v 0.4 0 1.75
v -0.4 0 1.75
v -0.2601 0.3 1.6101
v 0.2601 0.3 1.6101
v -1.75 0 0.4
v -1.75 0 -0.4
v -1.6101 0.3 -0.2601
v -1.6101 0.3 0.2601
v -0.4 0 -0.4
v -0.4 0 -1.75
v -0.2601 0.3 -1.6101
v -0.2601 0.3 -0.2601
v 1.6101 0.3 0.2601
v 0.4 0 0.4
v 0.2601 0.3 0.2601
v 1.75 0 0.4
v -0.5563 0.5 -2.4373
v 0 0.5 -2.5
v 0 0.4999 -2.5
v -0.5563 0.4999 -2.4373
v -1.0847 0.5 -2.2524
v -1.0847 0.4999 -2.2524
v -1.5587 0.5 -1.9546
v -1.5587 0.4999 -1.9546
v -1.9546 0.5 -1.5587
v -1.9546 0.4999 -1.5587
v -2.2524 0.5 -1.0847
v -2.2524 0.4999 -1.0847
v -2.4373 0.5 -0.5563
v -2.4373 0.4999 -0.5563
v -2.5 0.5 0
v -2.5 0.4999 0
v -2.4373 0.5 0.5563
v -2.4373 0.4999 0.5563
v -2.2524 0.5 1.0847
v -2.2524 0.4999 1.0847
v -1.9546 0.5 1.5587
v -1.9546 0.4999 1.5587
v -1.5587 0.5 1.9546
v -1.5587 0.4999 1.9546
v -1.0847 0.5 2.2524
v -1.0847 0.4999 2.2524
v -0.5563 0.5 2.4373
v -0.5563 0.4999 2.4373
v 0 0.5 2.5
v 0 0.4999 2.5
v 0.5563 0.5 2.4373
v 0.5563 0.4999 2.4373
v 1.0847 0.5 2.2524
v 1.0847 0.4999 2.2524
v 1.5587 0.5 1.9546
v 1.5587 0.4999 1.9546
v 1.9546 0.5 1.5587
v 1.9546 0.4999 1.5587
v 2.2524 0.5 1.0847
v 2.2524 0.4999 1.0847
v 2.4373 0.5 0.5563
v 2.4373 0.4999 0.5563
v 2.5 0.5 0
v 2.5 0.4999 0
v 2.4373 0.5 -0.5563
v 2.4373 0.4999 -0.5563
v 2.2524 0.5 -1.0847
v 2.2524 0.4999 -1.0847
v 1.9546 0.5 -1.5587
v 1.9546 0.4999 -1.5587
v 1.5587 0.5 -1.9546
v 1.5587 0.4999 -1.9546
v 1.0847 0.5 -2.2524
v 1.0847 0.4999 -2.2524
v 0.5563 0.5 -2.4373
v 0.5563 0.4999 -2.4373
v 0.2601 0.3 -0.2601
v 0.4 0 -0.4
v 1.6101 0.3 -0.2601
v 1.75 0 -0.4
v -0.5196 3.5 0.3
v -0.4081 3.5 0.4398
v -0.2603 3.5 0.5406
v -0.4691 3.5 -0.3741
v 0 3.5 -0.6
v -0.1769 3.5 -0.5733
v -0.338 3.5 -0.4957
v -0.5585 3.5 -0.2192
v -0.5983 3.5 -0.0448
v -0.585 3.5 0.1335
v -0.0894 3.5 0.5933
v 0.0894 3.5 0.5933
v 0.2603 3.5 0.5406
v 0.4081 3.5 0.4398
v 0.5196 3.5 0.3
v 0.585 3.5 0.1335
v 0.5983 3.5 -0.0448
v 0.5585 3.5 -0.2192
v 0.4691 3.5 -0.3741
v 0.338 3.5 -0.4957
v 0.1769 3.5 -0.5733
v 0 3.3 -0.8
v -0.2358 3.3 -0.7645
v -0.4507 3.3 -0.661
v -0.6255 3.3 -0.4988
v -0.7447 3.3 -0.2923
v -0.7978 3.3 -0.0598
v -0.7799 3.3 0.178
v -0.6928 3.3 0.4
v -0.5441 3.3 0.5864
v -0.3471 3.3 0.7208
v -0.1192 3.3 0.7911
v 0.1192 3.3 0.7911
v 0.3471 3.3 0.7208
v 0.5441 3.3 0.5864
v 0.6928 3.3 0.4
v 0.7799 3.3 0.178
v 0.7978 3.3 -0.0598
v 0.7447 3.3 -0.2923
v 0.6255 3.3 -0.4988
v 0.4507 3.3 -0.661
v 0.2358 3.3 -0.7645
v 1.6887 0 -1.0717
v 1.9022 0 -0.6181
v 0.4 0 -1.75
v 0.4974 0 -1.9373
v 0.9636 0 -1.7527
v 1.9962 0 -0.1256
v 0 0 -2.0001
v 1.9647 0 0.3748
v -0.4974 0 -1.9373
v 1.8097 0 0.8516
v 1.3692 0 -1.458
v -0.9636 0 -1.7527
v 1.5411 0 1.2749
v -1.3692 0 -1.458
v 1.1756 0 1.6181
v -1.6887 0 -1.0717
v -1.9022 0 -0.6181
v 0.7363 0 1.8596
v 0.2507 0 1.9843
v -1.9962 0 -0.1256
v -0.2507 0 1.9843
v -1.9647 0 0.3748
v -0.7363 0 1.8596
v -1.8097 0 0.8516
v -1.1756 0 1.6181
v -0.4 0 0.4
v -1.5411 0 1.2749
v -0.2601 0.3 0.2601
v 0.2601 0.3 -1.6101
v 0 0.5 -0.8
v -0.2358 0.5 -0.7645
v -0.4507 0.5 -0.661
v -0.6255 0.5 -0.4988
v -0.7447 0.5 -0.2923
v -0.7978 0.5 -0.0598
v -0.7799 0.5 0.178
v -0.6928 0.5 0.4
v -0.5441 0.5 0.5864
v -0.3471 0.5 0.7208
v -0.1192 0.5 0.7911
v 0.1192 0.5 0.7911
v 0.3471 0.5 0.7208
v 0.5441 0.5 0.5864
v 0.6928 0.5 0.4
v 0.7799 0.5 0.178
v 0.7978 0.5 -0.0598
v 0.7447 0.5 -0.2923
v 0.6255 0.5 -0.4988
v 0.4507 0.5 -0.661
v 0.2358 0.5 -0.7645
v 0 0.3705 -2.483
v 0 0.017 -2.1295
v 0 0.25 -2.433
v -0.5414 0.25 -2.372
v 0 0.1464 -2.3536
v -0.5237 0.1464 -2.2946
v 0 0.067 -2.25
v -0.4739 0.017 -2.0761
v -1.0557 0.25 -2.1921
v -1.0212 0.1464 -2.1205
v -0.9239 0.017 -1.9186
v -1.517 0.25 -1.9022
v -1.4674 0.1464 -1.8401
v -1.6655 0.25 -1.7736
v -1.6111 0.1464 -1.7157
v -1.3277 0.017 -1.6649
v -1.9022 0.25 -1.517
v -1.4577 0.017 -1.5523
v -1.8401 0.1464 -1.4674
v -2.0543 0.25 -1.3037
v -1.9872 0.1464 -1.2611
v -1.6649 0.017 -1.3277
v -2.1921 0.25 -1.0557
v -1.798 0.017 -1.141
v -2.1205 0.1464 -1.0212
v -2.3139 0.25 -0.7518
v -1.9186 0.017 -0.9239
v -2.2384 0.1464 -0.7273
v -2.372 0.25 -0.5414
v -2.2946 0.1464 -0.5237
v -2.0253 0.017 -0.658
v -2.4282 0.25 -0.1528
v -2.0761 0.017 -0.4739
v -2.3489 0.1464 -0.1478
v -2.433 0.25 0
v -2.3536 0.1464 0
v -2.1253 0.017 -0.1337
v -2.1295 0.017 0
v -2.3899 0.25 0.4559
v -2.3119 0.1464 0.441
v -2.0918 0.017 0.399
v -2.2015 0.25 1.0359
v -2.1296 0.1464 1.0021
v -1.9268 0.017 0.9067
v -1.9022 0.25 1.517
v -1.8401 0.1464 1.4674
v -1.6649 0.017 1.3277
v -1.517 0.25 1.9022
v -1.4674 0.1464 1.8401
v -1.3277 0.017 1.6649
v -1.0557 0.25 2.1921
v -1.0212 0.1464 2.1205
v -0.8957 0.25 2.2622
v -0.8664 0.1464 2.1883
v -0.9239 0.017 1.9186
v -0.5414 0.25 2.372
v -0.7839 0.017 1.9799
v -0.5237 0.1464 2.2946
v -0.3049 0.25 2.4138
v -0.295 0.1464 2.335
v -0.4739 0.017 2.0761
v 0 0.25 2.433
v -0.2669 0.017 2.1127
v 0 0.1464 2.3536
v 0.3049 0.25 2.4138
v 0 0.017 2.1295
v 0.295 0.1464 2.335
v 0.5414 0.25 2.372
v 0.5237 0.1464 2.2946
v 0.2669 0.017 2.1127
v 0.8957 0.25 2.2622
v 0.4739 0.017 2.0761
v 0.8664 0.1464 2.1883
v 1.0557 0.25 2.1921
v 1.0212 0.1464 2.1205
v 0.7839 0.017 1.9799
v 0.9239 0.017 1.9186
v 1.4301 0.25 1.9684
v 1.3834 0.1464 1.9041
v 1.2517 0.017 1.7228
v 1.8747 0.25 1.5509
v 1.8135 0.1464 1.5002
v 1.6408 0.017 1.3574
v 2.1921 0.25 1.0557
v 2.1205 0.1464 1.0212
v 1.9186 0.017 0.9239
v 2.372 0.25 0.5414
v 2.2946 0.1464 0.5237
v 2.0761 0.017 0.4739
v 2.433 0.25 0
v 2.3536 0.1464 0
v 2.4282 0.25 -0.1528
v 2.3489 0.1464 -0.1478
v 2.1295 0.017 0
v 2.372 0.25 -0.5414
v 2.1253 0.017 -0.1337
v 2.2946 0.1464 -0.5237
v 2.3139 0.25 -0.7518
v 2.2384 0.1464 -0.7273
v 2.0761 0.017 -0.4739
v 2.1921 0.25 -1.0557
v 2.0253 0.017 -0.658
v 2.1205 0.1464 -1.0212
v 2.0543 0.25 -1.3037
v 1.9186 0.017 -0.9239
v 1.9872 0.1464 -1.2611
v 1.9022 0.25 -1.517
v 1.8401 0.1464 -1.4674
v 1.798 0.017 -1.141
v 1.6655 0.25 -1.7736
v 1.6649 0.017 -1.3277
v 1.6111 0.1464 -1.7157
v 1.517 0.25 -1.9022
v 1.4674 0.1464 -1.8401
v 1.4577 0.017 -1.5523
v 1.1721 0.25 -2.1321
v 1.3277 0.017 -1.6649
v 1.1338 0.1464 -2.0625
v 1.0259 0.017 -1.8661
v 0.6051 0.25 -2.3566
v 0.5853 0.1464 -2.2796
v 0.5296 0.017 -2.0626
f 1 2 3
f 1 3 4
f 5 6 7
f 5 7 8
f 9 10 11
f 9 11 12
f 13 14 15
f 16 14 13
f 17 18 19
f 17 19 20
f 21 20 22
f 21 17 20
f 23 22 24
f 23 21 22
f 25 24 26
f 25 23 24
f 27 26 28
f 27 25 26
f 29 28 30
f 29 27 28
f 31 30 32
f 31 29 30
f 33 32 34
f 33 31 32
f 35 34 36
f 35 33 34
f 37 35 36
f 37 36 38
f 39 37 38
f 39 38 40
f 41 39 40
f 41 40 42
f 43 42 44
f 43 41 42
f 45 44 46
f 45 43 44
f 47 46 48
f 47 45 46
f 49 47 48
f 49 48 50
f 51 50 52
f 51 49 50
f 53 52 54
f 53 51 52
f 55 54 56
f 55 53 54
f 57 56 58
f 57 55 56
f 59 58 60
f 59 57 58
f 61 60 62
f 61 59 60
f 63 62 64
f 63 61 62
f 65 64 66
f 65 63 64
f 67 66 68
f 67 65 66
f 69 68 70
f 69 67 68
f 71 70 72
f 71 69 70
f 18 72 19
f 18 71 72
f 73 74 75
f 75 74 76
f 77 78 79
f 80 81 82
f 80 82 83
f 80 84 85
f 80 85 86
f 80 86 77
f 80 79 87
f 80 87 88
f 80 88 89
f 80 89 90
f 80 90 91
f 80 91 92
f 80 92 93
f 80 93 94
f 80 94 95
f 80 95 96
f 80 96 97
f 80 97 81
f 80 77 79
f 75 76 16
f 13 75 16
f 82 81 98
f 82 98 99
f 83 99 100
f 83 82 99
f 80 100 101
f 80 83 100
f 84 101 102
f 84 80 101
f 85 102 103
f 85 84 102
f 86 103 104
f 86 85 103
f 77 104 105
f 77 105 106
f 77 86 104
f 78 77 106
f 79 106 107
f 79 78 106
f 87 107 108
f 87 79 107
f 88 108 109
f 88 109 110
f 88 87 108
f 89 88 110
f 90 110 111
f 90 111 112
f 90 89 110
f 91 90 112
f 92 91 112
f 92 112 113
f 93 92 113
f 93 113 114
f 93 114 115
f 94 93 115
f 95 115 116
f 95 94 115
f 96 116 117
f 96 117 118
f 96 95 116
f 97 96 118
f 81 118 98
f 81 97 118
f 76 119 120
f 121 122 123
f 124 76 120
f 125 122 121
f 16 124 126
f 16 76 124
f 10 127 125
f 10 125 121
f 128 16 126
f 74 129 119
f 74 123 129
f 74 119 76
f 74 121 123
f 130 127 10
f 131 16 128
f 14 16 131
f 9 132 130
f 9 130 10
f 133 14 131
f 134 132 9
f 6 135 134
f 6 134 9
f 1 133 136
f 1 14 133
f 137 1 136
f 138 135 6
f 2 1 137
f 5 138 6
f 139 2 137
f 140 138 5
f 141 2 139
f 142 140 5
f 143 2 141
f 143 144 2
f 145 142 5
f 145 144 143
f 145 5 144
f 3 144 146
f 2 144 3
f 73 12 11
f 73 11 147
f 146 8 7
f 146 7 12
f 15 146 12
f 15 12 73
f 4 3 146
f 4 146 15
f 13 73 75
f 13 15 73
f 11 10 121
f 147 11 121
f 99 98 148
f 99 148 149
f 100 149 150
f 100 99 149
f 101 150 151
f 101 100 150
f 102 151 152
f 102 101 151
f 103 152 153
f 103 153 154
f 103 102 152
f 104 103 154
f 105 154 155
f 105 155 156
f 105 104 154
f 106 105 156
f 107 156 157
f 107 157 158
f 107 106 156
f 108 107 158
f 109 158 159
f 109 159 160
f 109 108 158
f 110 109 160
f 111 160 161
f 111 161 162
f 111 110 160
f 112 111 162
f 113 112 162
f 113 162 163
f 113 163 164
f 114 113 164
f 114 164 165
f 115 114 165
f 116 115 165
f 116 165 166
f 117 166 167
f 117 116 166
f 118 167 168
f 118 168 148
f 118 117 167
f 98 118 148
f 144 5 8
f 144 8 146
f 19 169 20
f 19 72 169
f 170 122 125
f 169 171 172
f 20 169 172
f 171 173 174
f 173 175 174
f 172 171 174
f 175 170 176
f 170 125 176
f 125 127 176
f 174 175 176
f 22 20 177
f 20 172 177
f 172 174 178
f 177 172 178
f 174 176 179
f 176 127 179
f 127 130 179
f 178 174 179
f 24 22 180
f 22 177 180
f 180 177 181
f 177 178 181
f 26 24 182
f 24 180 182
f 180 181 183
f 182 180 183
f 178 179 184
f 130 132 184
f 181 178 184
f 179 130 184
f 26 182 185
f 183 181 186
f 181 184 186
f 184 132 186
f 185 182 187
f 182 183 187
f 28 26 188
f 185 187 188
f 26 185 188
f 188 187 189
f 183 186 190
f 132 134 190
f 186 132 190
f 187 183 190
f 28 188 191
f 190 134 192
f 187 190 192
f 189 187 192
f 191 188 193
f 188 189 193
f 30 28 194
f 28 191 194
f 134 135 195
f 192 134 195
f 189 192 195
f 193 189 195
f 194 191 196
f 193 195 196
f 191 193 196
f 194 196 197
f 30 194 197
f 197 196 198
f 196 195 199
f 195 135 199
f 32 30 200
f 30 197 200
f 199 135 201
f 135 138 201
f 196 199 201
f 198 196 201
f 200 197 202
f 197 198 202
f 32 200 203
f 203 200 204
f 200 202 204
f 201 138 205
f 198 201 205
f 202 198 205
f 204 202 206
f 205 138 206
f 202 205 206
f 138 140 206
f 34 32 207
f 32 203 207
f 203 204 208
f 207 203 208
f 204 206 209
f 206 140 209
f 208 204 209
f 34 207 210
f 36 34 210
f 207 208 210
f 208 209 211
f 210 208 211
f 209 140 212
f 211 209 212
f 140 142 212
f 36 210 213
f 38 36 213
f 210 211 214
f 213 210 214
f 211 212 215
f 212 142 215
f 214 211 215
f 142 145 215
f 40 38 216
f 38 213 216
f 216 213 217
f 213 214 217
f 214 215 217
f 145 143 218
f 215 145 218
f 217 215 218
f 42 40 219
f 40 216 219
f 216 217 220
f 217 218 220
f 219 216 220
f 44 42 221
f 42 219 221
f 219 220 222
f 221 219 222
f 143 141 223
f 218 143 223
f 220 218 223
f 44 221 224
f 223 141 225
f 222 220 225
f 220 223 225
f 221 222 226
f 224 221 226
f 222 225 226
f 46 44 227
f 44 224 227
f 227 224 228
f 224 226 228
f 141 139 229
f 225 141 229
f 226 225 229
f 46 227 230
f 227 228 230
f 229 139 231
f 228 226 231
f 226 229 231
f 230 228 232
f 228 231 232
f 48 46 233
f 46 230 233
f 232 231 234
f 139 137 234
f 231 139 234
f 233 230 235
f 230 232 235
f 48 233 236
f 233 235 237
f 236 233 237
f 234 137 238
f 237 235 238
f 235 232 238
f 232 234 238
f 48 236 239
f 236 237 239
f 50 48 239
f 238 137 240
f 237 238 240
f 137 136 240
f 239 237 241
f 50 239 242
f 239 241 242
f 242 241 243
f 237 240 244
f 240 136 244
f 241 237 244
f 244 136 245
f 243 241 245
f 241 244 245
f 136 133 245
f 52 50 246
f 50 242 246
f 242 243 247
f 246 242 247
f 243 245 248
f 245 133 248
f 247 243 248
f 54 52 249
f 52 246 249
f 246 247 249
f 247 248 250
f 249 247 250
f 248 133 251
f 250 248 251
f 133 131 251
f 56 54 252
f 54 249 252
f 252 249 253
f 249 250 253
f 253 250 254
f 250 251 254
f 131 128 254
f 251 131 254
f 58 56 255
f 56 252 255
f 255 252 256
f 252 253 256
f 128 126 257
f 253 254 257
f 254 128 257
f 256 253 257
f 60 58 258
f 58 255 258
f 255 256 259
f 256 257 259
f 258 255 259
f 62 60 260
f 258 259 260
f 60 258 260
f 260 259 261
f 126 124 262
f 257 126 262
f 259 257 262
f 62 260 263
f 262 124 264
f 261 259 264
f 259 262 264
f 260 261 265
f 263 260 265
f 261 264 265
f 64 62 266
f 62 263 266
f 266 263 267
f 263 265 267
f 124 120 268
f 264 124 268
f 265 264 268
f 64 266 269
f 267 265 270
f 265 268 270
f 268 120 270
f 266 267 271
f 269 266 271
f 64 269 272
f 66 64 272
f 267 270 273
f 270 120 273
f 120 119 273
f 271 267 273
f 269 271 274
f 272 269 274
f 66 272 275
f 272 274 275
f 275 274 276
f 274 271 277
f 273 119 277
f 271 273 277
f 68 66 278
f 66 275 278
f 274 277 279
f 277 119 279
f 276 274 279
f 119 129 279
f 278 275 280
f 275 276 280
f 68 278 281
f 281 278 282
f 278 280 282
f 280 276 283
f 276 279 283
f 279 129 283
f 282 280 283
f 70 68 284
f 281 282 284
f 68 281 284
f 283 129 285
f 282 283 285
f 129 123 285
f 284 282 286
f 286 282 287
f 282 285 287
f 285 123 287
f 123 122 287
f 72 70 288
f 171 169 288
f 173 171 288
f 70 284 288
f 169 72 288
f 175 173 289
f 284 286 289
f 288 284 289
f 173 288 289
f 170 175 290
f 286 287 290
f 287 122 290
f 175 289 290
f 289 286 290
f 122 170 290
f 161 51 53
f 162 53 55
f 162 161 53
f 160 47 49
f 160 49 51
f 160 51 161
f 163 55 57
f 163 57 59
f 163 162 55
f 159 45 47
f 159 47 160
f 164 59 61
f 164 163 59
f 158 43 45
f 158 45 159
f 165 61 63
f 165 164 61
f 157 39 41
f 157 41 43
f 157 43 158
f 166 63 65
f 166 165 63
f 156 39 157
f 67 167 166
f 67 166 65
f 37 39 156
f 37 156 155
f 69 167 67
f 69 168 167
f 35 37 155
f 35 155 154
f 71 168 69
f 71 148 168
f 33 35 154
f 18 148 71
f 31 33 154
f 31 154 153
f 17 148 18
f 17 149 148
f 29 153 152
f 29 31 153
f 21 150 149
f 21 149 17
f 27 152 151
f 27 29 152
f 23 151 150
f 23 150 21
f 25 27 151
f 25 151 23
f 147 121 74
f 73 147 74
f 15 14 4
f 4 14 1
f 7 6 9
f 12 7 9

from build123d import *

# Parameters (mm, degrees)
CHAMFER_1_SIZE                = 0.2
FILLET_1_R                    = 0.5
SKETCH_2_W                    = 0.8
SKETCH_2_H                    = 3.5
CUT_EXTRUDE_1_DEPTH           = 0.3
CUT_EXTRUDE_1_DRAFT           = -25
SKETCH_2_W_2                  = 3.5
SKETCH_2_H_2                  = 0.8
CUT_EXTRUDE_1_PROFILE_2_DEPTH = 0.3
CUT_EXTRUDE_1_PROFILE_2_DRAFT = -25


with BuildPart() as part:
    # 草图1 → 旋转1 (revolve)
    with BuildSketch(Plane.XY, mode=Mode.PRIVATE) as revolve_1_sk:
        Polygon((0, 0), (-2.5, 0), (-2.5, 0.5), (-0.8, 0.5), (-0.8, 3.5), (0, 3.5), align=None)
    revolve(revolve_1_sk.sketch.rotate(Axis((0, 0, 0), (0, 1, 0)), 270), axis=Axis((0, 0, 0), (0, 1, 0)))

    # 倒角1
    chamfer_1_edges = [part.edges().sort_by_distance(p)[0] for p in [
        (0, 3.5, 0.8),
    ]]
    chamfer(chamfer_1_edges, length=CHAMFER_1_SIZE)

    # 圆角1
    fillet_1_edges = [part.edges().sort_by_distance(p)[0] for p in [
        (0, 0, 2.5),
    ]]
    fillet(fillet_1_edges, radius=FILLET_1_R - 0.0001)  # a hair under: the kernel refuses the full size


with BuildPart() as cut_extrude_1_tool:
    # 草图2 → 切除-拉伸1 (with draft: the straight prism first)
    with BuildSketch(Plane.XZ):
        Rectangle(SKETCH_2_W, SKETCH_2_H)
    extrude(amount=-CUT_EXTRUDE_1_DEPTH)
    # 切除-拉伸1: the draft: its side faces are tilted about the plane it starts from
    cut_extrude_1_sides = [cut_extrude_1_tool.faces().sort_by_distance(p)[0] for p in [
        (-0.4, 0.15, 0),
        (0, 0.15, -1.75),
        (0.4, 0.15, 0),
        (0, 0.15, 1.75),
    ]]
    draft(cut_extrude_1_sides, Plane.XZ, CUT_EXTRUDE_1_DRAFT)


with BuildPart() as part_1:
    add(part.part)

    # 切除-拉伸1: cut by cut_extrude_1_tool
    add(cut_extrude_1_tool.part, mode=Mode.SUBTRACT)


with BuildPart() as cut_extrude_1_profile_2_tool:
    # 草图2 → 切除-拉伸1 profile 2 (with draft: the straight prism first)
    with BuildSketch(Plane.XZ):
        Rectangle(SKETCH_2_W_2, SKETCH_2_H_2)
    extrude(amount=-CUT_EXTRUDE_1_PROFILE_2_DEPTH)
    # 切除-拉伸1 profile 2: the draft: its side faces are tilted about the plane it starts from
    cut_extrude_1_profile_2_sides = [cut_extrude_1_profile_2_tool.faces().sort_by_distance(p)[0] for p in [
        (-1.75, 0.15, 0),
        (0, 0.15, -0.4),
        (1.75, 0.15, 0),
        (0, 0.15, 0.4),
    ]]
    draft(cut_extrude_1_profile_2_sides, Plane.XZ, CUT_EXTRUDE_1_PROFILE_2_DRAFT)


with BuildPart() as part_2:
    add(part_1.part)

    # 切除-拉伸1 profile 2: cut by cut_extrude_1_profile_2_tool
    add(cut_extrude_1_profile_2_tool.part, mode=Mode.SUBTRACT)


solid = part_2.part
